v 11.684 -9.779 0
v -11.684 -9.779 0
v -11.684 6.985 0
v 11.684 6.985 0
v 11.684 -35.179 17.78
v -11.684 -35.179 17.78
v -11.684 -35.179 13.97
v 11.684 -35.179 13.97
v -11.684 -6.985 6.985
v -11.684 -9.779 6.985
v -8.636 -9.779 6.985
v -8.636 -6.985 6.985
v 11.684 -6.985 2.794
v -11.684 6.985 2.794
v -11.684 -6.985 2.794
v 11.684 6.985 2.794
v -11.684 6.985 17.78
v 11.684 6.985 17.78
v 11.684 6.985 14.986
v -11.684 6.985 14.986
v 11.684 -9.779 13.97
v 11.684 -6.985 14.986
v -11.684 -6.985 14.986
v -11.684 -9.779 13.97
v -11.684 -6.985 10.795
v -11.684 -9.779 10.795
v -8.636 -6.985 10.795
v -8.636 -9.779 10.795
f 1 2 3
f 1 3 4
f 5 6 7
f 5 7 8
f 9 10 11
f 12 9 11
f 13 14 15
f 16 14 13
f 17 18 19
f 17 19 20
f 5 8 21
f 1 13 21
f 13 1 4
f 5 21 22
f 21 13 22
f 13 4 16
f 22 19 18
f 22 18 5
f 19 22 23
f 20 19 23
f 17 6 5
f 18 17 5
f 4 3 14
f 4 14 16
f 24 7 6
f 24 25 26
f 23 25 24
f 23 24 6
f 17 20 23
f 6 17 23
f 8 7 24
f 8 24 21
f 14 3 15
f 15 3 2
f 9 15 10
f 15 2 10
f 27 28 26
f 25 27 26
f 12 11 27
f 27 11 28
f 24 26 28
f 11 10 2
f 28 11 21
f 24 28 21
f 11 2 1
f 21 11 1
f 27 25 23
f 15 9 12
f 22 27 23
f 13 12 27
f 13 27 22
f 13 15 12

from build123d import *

# Parameters (mm, degrees)
F0_W      = 23.368
F0_H      = 13.97
F1_DEPTH  = 2.794
F2_W      = 23.368
F2_H      = 2.794
F3_DEPTH  = 14.986
F3_FACE_W = 23.368
F3_FACE_H = 2.794
F4_DEPTH  = 2.794
F5_W      = 23.368
F5_H      = 2.794
F6_DEPTH  = 13.97
F8_DEPTH  = 25.4
F9_W      = 23.368
F9_H      = 3.81
F10_DEPTH = 25.4


with BuildPart() as f1:
    # F0 (on Top) → F1 (new body)
    with BuildSketch(Plane.XY):
        Rectangle(F0_W, F0_H)
    extrude(amount=F1_DEPTH)

    # F2 (on face) → F3 (join)
    with BuildSketch(Plane(origin=(0, 0, 0), x_dir=(1, 0, 0), z_dir=(0, 0, -1))):
        with Locations((0, 8.382)):
            Rectangle(F2_W, F2_H)
    extrude(amount=-F3_DEPTH)

    # F3_face (on face) → F4 (join)
    with BuildSketch(Plane(origin=(0, -8.382, 14.986), x_dir=(1, 0, 0), z_dir=(0, 0, 1))):
        Rectangle(F3_FACE_W, F3_FACE_H)
    extrude(amount=F4_DEPTH)

    # F5 (on face) → F6 (join)
    with BuildSketch(Plane(origin=(0, -6.985, 0), x_dir=(-1, 0, 0), z_dir=(0, 1, 0))):
        with Locations((0, 16.383)):
            Rectangle(F5_W, F5_H)
    extrude(amount=F6_DEPTH)

    # F7 (on face) → F8 (cut)
    with BuildSketch(Plane.XZ.offset(9.779)):
        Polygon((-8.636, 10.795), (-11.684, 10.795), (-11.684, 8.89), (-11.684, 6.985), (-8.636, 6.985), align=None)
    extrude(amount=-F8_DEPTH, mode=Mode.SUBTRACT)

    # F9 (on face) → F10 (join)
    with BuildSketch(Plane.XZ.offset(9.779)):
        with Locations((0, 15.875)):
            Rectangle(F9_W, F9_H)
    extrude(amount=F10_DEPTH)


solid = f1.part
